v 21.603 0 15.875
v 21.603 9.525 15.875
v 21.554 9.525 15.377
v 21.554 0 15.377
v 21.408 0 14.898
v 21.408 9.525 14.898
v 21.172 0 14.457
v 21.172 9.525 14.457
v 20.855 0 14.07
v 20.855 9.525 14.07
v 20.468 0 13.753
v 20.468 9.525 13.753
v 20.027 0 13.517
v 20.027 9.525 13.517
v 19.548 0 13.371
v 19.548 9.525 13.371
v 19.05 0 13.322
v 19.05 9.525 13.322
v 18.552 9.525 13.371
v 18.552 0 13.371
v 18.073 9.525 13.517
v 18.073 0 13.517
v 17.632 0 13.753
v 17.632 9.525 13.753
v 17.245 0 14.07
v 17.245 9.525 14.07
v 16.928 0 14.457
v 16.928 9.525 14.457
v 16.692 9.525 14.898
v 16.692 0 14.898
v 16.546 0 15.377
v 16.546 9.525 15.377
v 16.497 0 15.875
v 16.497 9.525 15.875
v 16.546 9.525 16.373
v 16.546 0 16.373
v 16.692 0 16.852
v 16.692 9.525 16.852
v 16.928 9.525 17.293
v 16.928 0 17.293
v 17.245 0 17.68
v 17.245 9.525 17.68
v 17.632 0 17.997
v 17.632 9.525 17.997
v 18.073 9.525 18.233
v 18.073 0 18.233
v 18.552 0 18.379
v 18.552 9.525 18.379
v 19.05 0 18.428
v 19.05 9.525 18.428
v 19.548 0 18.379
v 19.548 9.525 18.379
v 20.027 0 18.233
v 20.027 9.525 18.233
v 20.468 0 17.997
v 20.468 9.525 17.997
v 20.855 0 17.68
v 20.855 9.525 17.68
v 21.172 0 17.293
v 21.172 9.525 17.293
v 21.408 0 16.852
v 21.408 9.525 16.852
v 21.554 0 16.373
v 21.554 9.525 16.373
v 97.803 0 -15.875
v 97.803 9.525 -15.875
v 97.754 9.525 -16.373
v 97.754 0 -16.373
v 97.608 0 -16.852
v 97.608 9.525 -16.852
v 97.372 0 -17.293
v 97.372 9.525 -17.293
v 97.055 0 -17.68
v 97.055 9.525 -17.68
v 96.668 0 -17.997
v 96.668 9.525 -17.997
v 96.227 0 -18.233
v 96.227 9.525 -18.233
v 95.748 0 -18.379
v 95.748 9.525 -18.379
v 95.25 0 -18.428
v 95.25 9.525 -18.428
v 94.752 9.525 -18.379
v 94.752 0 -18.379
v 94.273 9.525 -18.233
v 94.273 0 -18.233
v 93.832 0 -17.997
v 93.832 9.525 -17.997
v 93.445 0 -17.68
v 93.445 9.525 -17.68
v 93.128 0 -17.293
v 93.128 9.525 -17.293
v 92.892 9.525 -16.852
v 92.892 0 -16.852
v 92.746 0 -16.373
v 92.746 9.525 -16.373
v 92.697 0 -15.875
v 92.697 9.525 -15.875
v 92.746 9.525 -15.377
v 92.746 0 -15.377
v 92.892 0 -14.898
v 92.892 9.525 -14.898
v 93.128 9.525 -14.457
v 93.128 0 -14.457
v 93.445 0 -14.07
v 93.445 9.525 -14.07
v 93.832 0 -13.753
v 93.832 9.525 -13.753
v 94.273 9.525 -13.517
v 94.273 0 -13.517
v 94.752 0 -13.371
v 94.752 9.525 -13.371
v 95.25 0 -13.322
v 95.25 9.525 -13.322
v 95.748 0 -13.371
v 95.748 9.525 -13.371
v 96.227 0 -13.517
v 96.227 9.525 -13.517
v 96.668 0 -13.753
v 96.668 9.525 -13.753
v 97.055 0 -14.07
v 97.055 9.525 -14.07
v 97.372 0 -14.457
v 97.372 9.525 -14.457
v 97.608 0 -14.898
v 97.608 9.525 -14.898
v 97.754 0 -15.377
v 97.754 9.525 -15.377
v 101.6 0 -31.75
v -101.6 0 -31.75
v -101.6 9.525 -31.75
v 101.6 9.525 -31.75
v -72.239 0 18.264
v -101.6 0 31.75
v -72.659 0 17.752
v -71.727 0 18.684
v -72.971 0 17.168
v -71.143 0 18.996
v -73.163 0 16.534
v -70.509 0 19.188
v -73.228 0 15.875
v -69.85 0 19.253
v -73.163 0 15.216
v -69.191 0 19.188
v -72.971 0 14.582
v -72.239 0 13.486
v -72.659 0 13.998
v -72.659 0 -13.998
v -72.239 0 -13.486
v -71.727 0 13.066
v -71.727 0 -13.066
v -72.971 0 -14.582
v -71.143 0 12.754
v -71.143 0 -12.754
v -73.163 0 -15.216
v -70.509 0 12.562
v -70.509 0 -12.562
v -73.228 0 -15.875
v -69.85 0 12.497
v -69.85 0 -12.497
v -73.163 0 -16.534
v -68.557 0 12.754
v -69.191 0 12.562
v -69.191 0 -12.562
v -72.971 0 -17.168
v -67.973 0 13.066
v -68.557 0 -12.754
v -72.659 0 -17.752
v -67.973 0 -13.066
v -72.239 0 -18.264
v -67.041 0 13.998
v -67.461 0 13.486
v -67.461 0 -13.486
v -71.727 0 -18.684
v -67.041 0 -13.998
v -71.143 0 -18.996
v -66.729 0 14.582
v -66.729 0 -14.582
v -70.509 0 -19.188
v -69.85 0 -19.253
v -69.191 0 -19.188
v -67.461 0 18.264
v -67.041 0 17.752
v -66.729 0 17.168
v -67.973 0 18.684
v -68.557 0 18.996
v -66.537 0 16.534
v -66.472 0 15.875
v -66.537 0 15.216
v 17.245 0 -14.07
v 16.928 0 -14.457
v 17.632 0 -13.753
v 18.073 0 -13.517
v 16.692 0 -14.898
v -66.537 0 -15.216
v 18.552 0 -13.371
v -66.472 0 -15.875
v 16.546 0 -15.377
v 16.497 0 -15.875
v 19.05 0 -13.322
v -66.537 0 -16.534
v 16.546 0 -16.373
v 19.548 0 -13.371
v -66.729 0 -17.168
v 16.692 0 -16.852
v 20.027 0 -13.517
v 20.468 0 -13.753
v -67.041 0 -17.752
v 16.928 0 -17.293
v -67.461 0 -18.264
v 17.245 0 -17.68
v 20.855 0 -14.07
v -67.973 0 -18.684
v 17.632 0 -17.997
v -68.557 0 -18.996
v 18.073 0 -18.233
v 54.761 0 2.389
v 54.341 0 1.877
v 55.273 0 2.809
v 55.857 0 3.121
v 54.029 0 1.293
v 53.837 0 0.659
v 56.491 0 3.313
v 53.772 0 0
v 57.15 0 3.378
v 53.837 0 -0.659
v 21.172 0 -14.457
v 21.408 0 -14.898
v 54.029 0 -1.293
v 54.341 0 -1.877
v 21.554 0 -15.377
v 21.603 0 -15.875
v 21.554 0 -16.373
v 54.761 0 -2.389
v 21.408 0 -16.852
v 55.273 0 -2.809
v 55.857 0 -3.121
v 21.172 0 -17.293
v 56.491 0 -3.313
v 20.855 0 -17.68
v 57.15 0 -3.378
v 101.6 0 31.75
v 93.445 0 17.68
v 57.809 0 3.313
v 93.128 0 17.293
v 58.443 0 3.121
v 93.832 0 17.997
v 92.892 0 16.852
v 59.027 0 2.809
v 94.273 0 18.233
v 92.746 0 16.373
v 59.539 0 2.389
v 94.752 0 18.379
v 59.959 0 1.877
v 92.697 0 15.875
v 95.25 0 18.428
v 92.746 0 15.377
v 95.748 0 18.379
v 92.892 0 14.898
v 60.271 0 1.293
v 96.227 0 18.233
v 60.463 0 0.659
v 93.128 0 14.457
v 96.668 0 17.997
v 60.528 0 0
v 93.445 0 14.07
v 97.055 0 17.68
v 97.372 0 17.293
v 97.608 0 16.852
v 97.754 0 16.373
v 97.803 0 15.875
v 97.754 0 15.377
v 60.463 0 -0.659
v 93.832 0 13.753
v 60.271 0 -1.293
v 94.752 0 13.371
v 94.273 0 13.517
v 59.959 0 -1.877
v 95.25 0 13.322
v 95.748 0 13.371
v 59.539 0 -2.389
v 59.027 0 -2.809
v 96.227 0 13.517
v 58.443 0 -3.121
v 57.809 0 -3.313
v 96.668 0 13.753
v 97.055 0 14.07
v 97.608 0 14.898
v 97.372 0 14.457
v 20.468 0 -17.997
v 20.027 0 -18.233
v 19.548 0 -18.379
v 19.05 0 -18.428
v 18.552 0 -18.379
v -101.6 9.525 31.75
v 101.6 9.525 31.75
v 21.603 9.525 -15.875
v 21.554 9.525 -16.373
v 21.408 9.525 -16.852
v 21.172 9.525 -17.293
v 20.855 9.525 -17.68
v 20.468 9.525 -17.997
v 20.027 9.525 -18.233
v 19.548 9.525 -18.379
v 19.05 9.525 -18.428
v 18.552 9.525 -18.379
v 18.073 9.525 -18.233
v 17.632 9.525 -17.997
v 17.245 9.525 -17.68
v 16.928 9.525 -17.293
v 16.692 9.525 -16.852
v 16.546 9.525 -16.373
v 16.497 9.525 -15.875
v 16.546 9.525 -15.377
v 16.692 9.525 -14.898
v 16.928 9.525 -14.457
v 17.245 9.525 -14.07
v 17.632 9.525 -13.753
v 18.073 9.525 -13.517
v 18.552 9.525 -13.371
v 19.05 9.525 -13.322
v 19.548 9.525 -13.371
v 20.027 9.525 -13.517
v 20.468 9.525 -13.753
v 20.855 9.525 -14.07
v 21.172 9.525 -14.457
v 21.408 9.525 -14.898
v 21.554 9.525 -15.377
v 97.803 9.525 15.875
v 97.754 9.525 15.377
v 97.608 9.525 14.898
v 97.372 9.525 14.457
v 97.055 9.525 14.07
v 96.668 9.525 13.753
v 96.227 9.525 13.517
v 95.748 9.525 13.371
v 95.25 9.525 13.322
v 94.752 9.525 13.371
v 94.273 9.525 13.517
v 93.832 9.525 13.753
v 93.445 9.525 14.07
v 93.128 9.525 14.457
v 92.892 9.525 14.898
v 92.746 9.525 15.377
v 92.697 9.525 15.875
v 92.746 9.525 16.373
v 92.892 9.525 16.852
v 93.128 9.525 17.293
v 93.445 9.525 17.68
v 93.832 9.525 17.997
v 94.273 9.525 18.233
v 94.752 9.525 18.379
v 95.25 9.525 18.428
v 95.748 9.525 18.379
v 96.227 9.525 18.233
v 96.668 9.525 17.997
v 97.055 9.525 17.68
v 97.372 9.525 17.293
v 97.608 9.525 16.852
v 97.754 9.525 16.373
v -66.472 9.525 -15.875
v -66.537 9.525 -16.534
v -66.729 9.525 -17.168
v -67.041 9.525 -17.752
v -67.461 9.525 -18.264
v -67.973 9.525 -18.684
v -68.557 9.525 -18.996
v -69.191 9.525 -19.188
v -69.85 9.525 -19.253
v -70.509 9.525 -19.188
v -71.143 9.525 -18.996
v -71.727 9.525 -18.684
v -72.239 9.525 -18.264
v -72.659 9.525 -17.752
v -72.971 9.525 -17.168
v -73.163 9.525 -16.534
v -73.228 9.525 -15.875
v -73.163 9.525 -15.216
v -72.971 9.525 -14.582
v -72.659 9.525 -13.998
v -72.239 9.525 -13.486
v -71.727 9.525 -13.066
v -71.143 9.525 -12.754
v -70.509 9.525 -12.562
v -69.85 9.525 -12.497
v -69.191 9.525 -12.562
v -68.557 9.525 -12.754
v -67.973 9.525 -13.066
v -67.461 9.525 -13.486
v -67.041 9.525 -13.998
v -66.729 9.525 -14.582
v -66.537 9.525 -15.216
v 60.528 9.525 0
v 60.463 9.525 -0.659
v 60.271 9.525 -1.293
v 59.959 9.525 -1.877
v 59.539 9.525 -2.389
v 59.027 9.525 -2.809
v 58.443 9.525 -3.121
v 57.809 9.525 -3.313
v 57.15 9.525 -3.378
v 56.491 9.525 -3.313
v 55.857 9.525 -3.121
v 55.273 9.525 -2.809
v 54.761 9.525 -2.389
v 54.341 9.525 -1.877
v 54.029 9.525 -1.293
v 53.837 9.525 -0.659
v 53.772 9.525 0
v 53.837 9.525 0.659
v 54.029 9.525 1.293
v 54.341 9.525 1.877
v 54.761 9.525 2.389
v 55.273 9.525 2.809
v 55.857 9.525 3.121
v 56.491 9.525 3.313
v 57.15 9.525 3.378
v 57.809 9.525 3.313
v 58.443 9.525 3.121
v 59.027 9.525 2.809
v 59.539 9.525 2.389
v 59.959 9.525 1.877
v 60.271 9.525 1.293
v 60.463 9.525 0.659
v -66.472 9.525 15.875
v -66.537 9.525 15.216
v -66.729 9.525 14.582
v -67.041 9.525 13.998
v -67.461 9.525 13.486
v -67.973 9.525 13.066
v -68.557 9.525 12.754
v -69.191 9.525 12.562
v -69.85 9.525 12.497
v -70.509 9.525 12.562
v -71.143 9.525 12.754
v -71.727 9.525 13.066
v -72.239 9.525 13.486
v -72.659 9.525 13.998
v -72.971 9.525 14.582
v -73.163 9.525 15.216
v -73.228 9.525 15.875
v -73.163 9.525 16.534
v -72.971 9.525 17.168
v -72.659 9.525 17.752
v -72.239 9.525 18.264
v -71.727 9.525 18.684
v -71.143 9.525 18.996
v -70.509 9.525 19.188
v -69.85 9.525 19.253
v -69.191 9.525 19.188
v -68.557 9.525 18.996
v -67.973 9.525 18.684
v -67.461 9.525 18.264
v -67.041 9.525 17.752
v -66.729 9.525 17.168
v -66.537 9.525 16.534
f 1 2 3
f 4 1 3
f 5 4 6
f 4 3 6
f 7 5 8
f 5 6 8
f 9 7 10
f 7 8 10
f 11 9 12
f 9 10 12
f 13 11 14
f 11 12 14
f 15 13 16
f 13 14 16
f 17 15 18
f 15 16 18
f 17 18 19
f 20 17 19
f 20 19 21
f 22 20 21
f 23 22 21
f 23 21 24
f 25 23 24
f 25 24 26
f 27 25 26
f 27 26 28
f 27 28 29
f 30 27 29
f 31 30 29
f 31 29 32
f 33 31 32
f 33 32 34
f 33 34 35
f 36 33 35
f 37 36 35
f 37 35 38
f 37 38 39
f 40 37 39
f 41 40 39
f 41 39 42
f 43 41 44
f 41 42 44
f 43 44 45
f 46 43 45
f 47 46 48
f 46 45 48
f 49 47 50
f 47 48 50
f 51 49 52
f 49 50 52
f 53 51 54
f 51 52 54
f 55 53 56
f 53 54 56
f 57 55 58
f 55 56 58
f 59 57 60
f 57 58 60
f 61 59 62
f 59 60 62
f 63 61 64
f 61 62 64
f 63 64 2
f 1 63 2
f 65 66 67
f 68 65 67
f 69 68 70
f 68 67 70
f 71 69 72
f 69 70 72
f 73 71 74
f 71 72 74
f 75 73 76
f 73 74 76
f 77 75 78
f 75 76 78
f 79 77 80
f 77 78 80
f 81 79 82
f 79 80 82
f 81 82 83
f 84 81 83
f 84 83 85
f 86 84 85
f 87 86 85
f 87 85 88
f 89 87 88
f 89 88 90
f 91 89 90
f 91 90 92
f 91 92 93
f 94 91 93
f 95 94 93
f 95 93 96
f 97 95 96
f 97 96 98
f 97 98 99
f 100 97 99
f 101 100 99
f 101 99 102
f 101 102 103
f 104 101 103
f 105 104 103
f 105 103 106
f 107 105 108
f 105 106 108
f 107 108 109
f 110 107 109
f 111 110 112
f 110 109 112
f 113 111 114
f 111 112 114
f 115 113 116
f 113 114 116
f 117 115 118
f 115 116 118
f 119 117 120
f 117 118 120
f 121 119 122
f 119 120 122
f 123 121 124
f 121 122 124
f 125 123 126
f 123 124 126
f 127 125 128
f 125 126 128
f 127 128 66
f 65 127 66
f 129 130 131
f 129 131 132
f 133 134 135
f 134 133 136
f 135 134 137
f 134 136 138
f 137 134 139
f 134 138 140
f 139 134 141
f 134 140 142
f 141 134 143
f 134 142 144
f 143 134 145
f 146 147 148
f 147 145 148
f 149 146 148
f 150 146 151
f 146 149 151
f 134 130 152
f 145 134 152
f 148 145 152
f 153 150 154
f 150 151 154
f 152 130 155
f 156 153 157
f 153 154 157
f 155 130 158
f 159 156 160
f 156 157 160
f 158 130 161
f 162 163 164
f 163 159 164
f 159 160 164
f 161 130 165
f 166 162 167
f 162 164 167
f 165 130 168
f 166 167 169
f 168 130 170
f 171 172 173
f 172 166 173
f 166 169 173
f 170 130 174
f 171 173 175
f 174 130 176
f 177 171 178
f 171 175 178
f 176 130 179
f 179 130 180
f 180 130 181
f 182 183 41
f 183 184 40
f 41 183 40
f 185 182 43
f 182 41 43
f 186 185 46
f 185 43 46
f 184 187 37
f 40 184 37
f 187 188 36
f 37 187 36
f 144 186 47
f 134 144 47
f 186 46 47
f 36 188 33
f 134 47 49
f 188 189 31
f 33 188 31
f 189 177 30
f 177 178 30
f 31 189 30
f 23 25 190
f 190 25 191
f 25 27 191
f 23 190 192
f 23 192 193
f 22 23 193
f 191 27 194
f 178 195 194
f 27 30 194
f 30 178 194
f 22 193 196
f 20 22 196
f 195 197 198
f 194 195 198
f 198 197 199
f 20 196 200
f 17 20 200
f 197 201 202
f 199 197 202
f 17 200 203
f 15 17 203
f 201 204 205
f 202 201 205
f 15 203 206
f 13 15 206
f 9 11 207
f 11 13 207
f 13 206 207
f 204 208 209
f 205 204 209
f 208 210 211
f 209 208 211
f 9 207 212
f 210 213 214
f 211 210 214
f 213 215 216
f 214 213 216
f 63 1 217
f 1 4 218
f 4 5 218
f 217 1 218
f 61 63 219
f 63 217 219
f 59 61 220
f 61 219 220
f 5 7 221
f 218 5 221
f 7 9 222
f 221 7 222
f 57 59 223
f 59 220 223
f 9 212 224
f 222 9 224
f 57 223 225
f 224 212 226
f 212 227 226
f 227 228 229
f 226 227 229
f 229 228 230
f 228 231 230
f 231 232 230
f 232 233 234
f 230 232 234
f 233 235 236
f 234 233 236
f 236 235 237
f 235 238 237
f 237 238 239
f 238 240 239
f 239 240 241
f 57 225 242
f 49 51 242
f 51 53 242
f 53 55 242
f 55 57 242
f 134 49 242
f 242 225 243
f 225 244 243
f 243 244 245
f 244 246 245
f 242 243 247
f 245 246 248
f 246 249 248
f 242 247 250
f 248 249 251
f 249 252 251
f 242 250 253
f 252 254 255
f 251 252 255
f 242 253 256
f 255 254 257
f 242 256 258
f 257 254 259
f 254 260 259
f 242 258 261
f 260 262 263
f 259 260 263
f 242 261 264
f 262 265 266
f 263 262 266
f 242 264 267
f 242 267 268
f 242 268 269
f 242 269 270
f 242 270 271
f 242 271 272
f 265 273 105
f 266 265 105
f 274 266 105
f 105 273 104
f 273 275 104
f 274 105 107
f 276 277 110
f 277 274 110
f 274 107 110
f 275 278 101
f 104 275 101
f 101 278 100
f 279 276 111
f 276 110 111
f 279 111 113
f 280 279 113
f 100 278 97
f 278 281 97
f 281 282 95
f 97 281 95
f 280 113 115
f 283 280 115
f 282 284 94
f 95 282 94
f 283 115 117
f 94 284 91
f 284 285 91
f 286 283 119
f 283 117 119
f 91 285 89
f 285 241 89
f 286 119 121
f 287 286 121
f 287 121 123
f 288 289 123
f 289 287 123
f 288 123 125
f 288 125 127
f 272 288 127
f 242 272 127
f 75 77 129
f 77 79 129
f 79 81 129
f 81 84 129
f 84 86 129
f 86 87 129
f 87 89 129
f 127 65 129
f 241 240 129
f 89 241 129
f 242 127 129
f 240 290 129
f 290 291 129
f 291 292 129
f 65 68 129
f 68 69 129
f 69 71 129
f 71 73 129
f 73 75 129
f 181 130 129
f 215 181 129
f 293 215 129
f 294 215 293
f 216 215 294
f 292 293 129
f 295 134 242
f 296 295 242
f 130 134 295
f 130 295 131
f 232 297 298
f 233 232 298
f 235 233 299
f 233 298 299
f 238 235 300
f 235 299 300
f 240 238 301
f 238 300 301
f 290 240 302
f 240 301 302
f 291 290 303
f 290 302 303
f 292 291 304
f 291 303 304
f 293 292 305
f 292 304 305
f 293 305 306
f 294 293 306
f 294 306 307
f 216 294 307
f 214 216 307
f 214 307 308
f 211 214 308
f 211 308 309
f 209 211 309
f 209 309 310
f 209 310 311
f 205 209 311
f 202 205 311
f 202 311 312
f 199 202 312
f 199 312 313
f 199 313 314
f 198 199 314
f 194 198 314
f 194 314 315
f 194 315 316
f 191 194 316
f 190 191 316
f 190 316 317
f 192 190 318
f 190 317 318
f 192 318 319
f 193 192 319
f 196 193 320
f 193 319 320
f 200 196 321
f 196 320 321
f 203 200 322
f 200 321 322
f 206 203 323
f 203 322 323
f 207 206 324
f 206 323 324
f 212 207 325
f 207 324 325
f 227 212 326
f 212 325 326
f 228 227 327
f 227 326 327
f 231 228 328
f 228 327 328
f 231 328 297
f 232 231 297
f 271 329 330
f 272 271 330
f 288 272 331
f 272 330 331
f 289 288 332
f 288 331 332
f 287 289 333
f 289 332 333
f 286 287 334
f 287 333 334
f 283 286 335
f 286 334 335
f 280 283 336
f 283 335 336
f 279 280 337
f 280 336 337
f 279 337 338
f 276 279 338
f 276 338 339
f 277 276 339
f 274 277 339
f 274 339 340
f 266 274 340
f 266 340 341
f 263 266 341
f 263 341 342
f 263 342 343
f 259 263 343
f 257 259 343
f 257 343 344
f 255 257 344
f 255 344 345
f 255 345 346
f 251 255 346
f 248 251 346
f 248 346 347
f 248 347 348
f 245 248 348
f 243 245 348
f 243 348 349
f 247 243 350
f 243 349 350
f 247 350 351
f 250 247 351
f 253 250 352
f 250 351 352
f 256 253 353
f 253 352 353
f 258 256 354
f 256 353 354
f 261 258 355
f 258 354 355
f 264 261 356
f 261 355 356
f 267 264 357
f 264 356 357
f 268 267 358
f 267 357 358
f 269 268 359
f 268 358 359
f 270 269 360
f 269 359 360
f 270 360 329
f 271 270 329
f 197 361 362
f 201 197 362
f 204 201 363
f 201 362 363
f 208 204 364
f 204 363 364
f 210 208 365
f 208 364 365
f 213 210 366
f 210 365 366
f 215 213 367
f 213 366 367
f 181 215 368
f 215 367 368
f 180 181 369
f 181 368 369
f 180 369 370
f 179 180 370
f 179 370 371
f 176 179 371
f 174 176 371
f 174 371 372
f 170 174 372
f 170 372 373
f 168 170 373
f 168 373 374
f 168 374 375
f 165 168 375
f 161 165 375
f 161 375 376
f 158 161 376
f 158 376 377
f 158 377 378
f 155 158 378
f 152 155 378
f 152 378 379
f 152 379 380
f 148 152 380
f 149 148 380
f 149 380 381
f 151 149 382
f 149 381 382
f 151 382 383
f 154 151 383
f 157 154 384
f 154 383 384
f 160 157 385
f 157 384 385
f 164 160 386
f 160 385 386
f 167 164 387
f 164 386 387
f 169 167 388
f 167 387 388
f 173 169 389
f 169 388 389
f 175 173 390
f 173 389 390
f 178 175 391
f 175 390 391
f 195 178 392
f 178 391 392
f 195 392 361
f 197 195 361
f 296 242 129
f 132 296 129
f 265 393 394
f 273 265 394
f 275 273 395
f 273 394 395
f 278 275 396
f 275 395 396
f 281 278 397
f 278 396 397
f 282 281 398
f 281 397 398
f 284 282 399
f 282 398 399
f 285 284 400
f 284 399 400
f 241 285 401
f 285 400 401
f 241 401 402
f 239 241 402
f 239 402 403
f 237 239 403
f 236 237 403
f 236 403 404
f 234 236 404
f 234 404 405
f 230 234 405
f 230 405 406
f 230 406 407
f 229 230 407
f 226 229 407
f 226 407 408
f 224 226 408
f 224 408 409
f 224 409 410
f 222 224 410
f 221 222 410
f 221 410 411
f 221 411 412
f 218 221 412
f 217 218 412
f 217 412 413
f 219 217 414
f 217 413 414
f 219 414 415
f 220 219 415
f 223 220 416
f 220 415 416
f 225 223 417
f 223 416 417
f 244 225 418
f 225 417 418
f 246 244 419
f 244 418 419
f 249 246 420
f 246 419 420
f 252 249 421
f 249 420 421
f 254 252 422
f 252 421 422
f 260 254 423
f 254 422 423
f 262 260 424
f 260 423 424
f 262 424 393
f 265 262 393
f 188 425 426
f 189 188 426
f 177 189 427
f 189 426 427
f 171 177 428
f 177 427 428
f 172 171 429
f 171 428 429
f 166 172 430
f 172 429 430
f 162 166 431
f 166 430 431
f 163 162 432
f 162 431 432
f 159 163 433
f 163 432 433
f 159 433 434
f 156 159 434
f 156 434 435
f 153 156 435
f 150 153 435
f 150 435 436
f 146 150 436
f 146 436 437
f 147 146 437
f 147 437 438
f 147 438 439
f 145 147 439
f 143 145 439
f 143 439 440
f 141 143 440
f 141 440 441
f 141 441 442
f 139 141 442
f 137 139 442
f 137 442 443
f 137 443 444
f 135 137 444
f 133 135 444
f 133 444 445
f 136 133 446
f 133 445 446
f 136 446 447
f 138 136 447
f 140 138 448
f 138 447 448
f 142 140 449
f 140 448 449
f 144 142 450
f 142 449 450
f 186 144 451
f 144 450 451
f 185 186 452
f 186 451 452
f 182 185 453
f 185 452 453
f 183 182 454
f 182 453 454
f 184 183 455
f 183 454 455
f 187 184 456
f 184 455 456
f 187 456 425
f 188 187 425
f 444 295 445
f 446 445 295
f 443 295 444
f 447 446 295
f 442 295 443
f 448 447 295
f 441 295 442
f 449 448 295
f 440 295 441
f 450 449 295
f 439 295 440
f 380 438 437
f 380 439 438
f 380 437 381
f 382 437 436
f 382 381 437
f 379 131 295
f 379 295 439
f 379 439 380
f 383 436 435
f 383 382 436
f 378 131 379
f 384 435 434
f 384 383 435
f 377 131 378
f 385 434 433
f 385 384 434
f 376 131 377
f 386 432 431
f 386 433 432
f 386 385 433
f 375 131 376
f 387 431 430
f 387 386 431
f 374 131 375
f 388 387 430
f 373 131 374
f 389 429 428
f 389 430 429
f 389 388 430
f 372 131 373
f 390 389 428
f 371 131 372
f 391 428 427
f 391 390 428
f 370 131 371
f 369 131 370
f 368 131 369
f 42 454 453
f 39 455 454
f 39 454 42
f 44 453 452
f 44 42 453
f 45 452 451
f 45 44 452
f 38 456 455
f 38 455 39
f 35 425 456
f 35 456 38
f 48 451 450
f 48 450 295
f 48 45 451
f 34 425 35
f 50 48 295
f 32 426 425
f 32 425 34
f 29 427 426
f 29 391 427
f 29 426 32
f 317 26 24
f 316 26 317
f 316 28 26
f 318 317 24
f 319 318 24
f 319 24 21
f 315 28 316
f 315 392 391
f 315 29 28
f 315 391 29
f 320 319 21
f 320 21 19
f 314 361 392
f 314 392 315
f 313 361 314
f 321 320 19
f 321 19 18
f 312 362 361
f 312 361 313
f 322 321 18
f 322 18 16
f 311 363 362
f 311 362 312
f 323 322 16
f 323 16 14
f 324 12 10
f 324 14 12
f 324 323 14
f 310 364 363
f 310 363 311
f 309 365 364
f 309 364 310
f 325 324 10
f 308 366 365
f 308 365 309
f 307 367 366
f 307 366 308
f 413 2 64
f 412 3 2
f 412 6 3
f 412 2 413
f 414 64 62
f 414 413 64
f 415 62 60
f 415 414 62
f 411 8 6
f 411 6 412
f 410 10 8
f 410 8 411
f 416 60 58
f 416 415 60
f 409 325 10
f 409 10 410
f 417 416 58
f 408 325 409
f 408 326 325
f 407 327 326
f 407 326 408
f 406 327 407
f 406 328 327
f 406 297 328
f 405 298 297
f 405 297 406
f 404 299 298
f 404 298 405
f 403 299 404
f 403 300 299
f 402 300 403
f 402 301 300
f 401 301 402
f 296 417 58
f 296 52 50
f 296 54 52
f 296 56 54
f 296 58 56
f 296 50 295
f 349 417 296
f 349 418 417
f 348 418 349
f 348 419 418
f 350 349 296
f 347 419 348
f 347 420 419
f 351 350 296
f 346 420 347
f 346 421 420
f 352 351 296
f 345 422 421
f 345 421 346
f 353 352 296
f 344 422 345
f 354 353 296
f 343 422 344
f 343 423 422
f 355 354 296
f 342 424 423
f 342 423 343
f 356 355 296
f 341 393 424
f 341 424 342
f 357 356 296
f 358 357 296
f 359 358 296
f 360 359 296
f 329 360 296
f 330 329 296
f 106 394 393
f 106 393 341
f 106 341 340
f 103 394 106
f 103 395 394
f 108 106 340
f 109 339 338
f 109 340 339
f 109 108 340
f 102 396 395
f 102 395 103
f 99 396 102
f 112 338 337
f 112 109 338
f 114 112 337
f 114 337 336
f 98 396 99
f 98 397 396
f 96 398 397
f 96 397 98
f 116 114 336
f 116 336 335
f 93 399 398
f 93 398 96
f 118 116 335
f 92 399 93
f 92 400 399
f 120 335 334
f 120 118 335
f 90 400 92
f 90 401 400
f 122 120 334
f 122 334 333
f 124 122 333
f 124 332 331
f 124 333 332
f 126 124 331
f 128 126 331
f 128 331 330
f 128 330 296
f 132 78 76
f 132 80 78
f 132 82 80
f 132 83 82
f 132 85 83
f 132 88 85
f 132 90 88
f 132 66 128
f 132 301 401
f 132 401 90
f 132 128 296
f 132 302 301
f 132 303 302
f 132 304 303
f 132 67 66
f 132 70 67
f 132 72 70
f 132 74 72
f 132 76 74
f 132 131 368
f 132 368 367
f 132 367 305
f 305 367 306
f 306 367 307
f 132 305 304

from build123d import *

# Parameters (mm, degrees)
SKETCH1_W               = 203.2
SKETCH1_H               = 63.5
BOSS_EXTRUDE1_DEPTH     = 9.525
F_10_CLEARANCE_HOLE1_D  = 5.1054
F_1_4_CLEARANCE_HOLE1_D = 6.7564
F_1_4_CLEARANCE_HOLE2_D = 6.7564


with BuildPart() as part:
    # Sketch1 → Boss-Extrude1 (new body)
    with BuildSketch(Plane(origin=(0, 0, 0), x_dir=(1, 0, 0), z_dir=(0, 1, 0))):
        Rectangle(SKETCH1_W, SKETCH1_H)
    extrude(amount=BOSS_EXTRUDE1_DEPTH)

    # #10 Clearance Hole1 (through all)
    with Locations(Plane(origin=(0, 0, 0), x_dir=(-1, 0, 0), z_dir=(0, -1, 0))):
        with Locations((-19.05, 15.875), (-95.25, 15.875), (-95.25, -15.875), (-19.05, -15.875)):
            Hole(F_10_CLEARANCE_HOLE1_D / 2)

    # 1/4 Clearance Hole1 (through all)
    with Locations(Plane(origin=(0, 0, 0), x_dir=(-1, 0, 0), z_dir=(0, -1, 0))):
        with Locations((-57.15, 0)):
            Hole(F_1_4_CLEARANCE_HOLE1_D / 2)

    # 1/4 Clearance Hole2 (through all)
    with Locations(Plane(origin=(0, 0, 0), x_dir=(-1, 0, 0), z_dir=(0, -1, 0))):
        with Locations((69.85, 15.875), (69.85, -15.875)):
            Hole(F_1_4_CLEARANCE_HOLE2_D / 2)


solid = part.part
